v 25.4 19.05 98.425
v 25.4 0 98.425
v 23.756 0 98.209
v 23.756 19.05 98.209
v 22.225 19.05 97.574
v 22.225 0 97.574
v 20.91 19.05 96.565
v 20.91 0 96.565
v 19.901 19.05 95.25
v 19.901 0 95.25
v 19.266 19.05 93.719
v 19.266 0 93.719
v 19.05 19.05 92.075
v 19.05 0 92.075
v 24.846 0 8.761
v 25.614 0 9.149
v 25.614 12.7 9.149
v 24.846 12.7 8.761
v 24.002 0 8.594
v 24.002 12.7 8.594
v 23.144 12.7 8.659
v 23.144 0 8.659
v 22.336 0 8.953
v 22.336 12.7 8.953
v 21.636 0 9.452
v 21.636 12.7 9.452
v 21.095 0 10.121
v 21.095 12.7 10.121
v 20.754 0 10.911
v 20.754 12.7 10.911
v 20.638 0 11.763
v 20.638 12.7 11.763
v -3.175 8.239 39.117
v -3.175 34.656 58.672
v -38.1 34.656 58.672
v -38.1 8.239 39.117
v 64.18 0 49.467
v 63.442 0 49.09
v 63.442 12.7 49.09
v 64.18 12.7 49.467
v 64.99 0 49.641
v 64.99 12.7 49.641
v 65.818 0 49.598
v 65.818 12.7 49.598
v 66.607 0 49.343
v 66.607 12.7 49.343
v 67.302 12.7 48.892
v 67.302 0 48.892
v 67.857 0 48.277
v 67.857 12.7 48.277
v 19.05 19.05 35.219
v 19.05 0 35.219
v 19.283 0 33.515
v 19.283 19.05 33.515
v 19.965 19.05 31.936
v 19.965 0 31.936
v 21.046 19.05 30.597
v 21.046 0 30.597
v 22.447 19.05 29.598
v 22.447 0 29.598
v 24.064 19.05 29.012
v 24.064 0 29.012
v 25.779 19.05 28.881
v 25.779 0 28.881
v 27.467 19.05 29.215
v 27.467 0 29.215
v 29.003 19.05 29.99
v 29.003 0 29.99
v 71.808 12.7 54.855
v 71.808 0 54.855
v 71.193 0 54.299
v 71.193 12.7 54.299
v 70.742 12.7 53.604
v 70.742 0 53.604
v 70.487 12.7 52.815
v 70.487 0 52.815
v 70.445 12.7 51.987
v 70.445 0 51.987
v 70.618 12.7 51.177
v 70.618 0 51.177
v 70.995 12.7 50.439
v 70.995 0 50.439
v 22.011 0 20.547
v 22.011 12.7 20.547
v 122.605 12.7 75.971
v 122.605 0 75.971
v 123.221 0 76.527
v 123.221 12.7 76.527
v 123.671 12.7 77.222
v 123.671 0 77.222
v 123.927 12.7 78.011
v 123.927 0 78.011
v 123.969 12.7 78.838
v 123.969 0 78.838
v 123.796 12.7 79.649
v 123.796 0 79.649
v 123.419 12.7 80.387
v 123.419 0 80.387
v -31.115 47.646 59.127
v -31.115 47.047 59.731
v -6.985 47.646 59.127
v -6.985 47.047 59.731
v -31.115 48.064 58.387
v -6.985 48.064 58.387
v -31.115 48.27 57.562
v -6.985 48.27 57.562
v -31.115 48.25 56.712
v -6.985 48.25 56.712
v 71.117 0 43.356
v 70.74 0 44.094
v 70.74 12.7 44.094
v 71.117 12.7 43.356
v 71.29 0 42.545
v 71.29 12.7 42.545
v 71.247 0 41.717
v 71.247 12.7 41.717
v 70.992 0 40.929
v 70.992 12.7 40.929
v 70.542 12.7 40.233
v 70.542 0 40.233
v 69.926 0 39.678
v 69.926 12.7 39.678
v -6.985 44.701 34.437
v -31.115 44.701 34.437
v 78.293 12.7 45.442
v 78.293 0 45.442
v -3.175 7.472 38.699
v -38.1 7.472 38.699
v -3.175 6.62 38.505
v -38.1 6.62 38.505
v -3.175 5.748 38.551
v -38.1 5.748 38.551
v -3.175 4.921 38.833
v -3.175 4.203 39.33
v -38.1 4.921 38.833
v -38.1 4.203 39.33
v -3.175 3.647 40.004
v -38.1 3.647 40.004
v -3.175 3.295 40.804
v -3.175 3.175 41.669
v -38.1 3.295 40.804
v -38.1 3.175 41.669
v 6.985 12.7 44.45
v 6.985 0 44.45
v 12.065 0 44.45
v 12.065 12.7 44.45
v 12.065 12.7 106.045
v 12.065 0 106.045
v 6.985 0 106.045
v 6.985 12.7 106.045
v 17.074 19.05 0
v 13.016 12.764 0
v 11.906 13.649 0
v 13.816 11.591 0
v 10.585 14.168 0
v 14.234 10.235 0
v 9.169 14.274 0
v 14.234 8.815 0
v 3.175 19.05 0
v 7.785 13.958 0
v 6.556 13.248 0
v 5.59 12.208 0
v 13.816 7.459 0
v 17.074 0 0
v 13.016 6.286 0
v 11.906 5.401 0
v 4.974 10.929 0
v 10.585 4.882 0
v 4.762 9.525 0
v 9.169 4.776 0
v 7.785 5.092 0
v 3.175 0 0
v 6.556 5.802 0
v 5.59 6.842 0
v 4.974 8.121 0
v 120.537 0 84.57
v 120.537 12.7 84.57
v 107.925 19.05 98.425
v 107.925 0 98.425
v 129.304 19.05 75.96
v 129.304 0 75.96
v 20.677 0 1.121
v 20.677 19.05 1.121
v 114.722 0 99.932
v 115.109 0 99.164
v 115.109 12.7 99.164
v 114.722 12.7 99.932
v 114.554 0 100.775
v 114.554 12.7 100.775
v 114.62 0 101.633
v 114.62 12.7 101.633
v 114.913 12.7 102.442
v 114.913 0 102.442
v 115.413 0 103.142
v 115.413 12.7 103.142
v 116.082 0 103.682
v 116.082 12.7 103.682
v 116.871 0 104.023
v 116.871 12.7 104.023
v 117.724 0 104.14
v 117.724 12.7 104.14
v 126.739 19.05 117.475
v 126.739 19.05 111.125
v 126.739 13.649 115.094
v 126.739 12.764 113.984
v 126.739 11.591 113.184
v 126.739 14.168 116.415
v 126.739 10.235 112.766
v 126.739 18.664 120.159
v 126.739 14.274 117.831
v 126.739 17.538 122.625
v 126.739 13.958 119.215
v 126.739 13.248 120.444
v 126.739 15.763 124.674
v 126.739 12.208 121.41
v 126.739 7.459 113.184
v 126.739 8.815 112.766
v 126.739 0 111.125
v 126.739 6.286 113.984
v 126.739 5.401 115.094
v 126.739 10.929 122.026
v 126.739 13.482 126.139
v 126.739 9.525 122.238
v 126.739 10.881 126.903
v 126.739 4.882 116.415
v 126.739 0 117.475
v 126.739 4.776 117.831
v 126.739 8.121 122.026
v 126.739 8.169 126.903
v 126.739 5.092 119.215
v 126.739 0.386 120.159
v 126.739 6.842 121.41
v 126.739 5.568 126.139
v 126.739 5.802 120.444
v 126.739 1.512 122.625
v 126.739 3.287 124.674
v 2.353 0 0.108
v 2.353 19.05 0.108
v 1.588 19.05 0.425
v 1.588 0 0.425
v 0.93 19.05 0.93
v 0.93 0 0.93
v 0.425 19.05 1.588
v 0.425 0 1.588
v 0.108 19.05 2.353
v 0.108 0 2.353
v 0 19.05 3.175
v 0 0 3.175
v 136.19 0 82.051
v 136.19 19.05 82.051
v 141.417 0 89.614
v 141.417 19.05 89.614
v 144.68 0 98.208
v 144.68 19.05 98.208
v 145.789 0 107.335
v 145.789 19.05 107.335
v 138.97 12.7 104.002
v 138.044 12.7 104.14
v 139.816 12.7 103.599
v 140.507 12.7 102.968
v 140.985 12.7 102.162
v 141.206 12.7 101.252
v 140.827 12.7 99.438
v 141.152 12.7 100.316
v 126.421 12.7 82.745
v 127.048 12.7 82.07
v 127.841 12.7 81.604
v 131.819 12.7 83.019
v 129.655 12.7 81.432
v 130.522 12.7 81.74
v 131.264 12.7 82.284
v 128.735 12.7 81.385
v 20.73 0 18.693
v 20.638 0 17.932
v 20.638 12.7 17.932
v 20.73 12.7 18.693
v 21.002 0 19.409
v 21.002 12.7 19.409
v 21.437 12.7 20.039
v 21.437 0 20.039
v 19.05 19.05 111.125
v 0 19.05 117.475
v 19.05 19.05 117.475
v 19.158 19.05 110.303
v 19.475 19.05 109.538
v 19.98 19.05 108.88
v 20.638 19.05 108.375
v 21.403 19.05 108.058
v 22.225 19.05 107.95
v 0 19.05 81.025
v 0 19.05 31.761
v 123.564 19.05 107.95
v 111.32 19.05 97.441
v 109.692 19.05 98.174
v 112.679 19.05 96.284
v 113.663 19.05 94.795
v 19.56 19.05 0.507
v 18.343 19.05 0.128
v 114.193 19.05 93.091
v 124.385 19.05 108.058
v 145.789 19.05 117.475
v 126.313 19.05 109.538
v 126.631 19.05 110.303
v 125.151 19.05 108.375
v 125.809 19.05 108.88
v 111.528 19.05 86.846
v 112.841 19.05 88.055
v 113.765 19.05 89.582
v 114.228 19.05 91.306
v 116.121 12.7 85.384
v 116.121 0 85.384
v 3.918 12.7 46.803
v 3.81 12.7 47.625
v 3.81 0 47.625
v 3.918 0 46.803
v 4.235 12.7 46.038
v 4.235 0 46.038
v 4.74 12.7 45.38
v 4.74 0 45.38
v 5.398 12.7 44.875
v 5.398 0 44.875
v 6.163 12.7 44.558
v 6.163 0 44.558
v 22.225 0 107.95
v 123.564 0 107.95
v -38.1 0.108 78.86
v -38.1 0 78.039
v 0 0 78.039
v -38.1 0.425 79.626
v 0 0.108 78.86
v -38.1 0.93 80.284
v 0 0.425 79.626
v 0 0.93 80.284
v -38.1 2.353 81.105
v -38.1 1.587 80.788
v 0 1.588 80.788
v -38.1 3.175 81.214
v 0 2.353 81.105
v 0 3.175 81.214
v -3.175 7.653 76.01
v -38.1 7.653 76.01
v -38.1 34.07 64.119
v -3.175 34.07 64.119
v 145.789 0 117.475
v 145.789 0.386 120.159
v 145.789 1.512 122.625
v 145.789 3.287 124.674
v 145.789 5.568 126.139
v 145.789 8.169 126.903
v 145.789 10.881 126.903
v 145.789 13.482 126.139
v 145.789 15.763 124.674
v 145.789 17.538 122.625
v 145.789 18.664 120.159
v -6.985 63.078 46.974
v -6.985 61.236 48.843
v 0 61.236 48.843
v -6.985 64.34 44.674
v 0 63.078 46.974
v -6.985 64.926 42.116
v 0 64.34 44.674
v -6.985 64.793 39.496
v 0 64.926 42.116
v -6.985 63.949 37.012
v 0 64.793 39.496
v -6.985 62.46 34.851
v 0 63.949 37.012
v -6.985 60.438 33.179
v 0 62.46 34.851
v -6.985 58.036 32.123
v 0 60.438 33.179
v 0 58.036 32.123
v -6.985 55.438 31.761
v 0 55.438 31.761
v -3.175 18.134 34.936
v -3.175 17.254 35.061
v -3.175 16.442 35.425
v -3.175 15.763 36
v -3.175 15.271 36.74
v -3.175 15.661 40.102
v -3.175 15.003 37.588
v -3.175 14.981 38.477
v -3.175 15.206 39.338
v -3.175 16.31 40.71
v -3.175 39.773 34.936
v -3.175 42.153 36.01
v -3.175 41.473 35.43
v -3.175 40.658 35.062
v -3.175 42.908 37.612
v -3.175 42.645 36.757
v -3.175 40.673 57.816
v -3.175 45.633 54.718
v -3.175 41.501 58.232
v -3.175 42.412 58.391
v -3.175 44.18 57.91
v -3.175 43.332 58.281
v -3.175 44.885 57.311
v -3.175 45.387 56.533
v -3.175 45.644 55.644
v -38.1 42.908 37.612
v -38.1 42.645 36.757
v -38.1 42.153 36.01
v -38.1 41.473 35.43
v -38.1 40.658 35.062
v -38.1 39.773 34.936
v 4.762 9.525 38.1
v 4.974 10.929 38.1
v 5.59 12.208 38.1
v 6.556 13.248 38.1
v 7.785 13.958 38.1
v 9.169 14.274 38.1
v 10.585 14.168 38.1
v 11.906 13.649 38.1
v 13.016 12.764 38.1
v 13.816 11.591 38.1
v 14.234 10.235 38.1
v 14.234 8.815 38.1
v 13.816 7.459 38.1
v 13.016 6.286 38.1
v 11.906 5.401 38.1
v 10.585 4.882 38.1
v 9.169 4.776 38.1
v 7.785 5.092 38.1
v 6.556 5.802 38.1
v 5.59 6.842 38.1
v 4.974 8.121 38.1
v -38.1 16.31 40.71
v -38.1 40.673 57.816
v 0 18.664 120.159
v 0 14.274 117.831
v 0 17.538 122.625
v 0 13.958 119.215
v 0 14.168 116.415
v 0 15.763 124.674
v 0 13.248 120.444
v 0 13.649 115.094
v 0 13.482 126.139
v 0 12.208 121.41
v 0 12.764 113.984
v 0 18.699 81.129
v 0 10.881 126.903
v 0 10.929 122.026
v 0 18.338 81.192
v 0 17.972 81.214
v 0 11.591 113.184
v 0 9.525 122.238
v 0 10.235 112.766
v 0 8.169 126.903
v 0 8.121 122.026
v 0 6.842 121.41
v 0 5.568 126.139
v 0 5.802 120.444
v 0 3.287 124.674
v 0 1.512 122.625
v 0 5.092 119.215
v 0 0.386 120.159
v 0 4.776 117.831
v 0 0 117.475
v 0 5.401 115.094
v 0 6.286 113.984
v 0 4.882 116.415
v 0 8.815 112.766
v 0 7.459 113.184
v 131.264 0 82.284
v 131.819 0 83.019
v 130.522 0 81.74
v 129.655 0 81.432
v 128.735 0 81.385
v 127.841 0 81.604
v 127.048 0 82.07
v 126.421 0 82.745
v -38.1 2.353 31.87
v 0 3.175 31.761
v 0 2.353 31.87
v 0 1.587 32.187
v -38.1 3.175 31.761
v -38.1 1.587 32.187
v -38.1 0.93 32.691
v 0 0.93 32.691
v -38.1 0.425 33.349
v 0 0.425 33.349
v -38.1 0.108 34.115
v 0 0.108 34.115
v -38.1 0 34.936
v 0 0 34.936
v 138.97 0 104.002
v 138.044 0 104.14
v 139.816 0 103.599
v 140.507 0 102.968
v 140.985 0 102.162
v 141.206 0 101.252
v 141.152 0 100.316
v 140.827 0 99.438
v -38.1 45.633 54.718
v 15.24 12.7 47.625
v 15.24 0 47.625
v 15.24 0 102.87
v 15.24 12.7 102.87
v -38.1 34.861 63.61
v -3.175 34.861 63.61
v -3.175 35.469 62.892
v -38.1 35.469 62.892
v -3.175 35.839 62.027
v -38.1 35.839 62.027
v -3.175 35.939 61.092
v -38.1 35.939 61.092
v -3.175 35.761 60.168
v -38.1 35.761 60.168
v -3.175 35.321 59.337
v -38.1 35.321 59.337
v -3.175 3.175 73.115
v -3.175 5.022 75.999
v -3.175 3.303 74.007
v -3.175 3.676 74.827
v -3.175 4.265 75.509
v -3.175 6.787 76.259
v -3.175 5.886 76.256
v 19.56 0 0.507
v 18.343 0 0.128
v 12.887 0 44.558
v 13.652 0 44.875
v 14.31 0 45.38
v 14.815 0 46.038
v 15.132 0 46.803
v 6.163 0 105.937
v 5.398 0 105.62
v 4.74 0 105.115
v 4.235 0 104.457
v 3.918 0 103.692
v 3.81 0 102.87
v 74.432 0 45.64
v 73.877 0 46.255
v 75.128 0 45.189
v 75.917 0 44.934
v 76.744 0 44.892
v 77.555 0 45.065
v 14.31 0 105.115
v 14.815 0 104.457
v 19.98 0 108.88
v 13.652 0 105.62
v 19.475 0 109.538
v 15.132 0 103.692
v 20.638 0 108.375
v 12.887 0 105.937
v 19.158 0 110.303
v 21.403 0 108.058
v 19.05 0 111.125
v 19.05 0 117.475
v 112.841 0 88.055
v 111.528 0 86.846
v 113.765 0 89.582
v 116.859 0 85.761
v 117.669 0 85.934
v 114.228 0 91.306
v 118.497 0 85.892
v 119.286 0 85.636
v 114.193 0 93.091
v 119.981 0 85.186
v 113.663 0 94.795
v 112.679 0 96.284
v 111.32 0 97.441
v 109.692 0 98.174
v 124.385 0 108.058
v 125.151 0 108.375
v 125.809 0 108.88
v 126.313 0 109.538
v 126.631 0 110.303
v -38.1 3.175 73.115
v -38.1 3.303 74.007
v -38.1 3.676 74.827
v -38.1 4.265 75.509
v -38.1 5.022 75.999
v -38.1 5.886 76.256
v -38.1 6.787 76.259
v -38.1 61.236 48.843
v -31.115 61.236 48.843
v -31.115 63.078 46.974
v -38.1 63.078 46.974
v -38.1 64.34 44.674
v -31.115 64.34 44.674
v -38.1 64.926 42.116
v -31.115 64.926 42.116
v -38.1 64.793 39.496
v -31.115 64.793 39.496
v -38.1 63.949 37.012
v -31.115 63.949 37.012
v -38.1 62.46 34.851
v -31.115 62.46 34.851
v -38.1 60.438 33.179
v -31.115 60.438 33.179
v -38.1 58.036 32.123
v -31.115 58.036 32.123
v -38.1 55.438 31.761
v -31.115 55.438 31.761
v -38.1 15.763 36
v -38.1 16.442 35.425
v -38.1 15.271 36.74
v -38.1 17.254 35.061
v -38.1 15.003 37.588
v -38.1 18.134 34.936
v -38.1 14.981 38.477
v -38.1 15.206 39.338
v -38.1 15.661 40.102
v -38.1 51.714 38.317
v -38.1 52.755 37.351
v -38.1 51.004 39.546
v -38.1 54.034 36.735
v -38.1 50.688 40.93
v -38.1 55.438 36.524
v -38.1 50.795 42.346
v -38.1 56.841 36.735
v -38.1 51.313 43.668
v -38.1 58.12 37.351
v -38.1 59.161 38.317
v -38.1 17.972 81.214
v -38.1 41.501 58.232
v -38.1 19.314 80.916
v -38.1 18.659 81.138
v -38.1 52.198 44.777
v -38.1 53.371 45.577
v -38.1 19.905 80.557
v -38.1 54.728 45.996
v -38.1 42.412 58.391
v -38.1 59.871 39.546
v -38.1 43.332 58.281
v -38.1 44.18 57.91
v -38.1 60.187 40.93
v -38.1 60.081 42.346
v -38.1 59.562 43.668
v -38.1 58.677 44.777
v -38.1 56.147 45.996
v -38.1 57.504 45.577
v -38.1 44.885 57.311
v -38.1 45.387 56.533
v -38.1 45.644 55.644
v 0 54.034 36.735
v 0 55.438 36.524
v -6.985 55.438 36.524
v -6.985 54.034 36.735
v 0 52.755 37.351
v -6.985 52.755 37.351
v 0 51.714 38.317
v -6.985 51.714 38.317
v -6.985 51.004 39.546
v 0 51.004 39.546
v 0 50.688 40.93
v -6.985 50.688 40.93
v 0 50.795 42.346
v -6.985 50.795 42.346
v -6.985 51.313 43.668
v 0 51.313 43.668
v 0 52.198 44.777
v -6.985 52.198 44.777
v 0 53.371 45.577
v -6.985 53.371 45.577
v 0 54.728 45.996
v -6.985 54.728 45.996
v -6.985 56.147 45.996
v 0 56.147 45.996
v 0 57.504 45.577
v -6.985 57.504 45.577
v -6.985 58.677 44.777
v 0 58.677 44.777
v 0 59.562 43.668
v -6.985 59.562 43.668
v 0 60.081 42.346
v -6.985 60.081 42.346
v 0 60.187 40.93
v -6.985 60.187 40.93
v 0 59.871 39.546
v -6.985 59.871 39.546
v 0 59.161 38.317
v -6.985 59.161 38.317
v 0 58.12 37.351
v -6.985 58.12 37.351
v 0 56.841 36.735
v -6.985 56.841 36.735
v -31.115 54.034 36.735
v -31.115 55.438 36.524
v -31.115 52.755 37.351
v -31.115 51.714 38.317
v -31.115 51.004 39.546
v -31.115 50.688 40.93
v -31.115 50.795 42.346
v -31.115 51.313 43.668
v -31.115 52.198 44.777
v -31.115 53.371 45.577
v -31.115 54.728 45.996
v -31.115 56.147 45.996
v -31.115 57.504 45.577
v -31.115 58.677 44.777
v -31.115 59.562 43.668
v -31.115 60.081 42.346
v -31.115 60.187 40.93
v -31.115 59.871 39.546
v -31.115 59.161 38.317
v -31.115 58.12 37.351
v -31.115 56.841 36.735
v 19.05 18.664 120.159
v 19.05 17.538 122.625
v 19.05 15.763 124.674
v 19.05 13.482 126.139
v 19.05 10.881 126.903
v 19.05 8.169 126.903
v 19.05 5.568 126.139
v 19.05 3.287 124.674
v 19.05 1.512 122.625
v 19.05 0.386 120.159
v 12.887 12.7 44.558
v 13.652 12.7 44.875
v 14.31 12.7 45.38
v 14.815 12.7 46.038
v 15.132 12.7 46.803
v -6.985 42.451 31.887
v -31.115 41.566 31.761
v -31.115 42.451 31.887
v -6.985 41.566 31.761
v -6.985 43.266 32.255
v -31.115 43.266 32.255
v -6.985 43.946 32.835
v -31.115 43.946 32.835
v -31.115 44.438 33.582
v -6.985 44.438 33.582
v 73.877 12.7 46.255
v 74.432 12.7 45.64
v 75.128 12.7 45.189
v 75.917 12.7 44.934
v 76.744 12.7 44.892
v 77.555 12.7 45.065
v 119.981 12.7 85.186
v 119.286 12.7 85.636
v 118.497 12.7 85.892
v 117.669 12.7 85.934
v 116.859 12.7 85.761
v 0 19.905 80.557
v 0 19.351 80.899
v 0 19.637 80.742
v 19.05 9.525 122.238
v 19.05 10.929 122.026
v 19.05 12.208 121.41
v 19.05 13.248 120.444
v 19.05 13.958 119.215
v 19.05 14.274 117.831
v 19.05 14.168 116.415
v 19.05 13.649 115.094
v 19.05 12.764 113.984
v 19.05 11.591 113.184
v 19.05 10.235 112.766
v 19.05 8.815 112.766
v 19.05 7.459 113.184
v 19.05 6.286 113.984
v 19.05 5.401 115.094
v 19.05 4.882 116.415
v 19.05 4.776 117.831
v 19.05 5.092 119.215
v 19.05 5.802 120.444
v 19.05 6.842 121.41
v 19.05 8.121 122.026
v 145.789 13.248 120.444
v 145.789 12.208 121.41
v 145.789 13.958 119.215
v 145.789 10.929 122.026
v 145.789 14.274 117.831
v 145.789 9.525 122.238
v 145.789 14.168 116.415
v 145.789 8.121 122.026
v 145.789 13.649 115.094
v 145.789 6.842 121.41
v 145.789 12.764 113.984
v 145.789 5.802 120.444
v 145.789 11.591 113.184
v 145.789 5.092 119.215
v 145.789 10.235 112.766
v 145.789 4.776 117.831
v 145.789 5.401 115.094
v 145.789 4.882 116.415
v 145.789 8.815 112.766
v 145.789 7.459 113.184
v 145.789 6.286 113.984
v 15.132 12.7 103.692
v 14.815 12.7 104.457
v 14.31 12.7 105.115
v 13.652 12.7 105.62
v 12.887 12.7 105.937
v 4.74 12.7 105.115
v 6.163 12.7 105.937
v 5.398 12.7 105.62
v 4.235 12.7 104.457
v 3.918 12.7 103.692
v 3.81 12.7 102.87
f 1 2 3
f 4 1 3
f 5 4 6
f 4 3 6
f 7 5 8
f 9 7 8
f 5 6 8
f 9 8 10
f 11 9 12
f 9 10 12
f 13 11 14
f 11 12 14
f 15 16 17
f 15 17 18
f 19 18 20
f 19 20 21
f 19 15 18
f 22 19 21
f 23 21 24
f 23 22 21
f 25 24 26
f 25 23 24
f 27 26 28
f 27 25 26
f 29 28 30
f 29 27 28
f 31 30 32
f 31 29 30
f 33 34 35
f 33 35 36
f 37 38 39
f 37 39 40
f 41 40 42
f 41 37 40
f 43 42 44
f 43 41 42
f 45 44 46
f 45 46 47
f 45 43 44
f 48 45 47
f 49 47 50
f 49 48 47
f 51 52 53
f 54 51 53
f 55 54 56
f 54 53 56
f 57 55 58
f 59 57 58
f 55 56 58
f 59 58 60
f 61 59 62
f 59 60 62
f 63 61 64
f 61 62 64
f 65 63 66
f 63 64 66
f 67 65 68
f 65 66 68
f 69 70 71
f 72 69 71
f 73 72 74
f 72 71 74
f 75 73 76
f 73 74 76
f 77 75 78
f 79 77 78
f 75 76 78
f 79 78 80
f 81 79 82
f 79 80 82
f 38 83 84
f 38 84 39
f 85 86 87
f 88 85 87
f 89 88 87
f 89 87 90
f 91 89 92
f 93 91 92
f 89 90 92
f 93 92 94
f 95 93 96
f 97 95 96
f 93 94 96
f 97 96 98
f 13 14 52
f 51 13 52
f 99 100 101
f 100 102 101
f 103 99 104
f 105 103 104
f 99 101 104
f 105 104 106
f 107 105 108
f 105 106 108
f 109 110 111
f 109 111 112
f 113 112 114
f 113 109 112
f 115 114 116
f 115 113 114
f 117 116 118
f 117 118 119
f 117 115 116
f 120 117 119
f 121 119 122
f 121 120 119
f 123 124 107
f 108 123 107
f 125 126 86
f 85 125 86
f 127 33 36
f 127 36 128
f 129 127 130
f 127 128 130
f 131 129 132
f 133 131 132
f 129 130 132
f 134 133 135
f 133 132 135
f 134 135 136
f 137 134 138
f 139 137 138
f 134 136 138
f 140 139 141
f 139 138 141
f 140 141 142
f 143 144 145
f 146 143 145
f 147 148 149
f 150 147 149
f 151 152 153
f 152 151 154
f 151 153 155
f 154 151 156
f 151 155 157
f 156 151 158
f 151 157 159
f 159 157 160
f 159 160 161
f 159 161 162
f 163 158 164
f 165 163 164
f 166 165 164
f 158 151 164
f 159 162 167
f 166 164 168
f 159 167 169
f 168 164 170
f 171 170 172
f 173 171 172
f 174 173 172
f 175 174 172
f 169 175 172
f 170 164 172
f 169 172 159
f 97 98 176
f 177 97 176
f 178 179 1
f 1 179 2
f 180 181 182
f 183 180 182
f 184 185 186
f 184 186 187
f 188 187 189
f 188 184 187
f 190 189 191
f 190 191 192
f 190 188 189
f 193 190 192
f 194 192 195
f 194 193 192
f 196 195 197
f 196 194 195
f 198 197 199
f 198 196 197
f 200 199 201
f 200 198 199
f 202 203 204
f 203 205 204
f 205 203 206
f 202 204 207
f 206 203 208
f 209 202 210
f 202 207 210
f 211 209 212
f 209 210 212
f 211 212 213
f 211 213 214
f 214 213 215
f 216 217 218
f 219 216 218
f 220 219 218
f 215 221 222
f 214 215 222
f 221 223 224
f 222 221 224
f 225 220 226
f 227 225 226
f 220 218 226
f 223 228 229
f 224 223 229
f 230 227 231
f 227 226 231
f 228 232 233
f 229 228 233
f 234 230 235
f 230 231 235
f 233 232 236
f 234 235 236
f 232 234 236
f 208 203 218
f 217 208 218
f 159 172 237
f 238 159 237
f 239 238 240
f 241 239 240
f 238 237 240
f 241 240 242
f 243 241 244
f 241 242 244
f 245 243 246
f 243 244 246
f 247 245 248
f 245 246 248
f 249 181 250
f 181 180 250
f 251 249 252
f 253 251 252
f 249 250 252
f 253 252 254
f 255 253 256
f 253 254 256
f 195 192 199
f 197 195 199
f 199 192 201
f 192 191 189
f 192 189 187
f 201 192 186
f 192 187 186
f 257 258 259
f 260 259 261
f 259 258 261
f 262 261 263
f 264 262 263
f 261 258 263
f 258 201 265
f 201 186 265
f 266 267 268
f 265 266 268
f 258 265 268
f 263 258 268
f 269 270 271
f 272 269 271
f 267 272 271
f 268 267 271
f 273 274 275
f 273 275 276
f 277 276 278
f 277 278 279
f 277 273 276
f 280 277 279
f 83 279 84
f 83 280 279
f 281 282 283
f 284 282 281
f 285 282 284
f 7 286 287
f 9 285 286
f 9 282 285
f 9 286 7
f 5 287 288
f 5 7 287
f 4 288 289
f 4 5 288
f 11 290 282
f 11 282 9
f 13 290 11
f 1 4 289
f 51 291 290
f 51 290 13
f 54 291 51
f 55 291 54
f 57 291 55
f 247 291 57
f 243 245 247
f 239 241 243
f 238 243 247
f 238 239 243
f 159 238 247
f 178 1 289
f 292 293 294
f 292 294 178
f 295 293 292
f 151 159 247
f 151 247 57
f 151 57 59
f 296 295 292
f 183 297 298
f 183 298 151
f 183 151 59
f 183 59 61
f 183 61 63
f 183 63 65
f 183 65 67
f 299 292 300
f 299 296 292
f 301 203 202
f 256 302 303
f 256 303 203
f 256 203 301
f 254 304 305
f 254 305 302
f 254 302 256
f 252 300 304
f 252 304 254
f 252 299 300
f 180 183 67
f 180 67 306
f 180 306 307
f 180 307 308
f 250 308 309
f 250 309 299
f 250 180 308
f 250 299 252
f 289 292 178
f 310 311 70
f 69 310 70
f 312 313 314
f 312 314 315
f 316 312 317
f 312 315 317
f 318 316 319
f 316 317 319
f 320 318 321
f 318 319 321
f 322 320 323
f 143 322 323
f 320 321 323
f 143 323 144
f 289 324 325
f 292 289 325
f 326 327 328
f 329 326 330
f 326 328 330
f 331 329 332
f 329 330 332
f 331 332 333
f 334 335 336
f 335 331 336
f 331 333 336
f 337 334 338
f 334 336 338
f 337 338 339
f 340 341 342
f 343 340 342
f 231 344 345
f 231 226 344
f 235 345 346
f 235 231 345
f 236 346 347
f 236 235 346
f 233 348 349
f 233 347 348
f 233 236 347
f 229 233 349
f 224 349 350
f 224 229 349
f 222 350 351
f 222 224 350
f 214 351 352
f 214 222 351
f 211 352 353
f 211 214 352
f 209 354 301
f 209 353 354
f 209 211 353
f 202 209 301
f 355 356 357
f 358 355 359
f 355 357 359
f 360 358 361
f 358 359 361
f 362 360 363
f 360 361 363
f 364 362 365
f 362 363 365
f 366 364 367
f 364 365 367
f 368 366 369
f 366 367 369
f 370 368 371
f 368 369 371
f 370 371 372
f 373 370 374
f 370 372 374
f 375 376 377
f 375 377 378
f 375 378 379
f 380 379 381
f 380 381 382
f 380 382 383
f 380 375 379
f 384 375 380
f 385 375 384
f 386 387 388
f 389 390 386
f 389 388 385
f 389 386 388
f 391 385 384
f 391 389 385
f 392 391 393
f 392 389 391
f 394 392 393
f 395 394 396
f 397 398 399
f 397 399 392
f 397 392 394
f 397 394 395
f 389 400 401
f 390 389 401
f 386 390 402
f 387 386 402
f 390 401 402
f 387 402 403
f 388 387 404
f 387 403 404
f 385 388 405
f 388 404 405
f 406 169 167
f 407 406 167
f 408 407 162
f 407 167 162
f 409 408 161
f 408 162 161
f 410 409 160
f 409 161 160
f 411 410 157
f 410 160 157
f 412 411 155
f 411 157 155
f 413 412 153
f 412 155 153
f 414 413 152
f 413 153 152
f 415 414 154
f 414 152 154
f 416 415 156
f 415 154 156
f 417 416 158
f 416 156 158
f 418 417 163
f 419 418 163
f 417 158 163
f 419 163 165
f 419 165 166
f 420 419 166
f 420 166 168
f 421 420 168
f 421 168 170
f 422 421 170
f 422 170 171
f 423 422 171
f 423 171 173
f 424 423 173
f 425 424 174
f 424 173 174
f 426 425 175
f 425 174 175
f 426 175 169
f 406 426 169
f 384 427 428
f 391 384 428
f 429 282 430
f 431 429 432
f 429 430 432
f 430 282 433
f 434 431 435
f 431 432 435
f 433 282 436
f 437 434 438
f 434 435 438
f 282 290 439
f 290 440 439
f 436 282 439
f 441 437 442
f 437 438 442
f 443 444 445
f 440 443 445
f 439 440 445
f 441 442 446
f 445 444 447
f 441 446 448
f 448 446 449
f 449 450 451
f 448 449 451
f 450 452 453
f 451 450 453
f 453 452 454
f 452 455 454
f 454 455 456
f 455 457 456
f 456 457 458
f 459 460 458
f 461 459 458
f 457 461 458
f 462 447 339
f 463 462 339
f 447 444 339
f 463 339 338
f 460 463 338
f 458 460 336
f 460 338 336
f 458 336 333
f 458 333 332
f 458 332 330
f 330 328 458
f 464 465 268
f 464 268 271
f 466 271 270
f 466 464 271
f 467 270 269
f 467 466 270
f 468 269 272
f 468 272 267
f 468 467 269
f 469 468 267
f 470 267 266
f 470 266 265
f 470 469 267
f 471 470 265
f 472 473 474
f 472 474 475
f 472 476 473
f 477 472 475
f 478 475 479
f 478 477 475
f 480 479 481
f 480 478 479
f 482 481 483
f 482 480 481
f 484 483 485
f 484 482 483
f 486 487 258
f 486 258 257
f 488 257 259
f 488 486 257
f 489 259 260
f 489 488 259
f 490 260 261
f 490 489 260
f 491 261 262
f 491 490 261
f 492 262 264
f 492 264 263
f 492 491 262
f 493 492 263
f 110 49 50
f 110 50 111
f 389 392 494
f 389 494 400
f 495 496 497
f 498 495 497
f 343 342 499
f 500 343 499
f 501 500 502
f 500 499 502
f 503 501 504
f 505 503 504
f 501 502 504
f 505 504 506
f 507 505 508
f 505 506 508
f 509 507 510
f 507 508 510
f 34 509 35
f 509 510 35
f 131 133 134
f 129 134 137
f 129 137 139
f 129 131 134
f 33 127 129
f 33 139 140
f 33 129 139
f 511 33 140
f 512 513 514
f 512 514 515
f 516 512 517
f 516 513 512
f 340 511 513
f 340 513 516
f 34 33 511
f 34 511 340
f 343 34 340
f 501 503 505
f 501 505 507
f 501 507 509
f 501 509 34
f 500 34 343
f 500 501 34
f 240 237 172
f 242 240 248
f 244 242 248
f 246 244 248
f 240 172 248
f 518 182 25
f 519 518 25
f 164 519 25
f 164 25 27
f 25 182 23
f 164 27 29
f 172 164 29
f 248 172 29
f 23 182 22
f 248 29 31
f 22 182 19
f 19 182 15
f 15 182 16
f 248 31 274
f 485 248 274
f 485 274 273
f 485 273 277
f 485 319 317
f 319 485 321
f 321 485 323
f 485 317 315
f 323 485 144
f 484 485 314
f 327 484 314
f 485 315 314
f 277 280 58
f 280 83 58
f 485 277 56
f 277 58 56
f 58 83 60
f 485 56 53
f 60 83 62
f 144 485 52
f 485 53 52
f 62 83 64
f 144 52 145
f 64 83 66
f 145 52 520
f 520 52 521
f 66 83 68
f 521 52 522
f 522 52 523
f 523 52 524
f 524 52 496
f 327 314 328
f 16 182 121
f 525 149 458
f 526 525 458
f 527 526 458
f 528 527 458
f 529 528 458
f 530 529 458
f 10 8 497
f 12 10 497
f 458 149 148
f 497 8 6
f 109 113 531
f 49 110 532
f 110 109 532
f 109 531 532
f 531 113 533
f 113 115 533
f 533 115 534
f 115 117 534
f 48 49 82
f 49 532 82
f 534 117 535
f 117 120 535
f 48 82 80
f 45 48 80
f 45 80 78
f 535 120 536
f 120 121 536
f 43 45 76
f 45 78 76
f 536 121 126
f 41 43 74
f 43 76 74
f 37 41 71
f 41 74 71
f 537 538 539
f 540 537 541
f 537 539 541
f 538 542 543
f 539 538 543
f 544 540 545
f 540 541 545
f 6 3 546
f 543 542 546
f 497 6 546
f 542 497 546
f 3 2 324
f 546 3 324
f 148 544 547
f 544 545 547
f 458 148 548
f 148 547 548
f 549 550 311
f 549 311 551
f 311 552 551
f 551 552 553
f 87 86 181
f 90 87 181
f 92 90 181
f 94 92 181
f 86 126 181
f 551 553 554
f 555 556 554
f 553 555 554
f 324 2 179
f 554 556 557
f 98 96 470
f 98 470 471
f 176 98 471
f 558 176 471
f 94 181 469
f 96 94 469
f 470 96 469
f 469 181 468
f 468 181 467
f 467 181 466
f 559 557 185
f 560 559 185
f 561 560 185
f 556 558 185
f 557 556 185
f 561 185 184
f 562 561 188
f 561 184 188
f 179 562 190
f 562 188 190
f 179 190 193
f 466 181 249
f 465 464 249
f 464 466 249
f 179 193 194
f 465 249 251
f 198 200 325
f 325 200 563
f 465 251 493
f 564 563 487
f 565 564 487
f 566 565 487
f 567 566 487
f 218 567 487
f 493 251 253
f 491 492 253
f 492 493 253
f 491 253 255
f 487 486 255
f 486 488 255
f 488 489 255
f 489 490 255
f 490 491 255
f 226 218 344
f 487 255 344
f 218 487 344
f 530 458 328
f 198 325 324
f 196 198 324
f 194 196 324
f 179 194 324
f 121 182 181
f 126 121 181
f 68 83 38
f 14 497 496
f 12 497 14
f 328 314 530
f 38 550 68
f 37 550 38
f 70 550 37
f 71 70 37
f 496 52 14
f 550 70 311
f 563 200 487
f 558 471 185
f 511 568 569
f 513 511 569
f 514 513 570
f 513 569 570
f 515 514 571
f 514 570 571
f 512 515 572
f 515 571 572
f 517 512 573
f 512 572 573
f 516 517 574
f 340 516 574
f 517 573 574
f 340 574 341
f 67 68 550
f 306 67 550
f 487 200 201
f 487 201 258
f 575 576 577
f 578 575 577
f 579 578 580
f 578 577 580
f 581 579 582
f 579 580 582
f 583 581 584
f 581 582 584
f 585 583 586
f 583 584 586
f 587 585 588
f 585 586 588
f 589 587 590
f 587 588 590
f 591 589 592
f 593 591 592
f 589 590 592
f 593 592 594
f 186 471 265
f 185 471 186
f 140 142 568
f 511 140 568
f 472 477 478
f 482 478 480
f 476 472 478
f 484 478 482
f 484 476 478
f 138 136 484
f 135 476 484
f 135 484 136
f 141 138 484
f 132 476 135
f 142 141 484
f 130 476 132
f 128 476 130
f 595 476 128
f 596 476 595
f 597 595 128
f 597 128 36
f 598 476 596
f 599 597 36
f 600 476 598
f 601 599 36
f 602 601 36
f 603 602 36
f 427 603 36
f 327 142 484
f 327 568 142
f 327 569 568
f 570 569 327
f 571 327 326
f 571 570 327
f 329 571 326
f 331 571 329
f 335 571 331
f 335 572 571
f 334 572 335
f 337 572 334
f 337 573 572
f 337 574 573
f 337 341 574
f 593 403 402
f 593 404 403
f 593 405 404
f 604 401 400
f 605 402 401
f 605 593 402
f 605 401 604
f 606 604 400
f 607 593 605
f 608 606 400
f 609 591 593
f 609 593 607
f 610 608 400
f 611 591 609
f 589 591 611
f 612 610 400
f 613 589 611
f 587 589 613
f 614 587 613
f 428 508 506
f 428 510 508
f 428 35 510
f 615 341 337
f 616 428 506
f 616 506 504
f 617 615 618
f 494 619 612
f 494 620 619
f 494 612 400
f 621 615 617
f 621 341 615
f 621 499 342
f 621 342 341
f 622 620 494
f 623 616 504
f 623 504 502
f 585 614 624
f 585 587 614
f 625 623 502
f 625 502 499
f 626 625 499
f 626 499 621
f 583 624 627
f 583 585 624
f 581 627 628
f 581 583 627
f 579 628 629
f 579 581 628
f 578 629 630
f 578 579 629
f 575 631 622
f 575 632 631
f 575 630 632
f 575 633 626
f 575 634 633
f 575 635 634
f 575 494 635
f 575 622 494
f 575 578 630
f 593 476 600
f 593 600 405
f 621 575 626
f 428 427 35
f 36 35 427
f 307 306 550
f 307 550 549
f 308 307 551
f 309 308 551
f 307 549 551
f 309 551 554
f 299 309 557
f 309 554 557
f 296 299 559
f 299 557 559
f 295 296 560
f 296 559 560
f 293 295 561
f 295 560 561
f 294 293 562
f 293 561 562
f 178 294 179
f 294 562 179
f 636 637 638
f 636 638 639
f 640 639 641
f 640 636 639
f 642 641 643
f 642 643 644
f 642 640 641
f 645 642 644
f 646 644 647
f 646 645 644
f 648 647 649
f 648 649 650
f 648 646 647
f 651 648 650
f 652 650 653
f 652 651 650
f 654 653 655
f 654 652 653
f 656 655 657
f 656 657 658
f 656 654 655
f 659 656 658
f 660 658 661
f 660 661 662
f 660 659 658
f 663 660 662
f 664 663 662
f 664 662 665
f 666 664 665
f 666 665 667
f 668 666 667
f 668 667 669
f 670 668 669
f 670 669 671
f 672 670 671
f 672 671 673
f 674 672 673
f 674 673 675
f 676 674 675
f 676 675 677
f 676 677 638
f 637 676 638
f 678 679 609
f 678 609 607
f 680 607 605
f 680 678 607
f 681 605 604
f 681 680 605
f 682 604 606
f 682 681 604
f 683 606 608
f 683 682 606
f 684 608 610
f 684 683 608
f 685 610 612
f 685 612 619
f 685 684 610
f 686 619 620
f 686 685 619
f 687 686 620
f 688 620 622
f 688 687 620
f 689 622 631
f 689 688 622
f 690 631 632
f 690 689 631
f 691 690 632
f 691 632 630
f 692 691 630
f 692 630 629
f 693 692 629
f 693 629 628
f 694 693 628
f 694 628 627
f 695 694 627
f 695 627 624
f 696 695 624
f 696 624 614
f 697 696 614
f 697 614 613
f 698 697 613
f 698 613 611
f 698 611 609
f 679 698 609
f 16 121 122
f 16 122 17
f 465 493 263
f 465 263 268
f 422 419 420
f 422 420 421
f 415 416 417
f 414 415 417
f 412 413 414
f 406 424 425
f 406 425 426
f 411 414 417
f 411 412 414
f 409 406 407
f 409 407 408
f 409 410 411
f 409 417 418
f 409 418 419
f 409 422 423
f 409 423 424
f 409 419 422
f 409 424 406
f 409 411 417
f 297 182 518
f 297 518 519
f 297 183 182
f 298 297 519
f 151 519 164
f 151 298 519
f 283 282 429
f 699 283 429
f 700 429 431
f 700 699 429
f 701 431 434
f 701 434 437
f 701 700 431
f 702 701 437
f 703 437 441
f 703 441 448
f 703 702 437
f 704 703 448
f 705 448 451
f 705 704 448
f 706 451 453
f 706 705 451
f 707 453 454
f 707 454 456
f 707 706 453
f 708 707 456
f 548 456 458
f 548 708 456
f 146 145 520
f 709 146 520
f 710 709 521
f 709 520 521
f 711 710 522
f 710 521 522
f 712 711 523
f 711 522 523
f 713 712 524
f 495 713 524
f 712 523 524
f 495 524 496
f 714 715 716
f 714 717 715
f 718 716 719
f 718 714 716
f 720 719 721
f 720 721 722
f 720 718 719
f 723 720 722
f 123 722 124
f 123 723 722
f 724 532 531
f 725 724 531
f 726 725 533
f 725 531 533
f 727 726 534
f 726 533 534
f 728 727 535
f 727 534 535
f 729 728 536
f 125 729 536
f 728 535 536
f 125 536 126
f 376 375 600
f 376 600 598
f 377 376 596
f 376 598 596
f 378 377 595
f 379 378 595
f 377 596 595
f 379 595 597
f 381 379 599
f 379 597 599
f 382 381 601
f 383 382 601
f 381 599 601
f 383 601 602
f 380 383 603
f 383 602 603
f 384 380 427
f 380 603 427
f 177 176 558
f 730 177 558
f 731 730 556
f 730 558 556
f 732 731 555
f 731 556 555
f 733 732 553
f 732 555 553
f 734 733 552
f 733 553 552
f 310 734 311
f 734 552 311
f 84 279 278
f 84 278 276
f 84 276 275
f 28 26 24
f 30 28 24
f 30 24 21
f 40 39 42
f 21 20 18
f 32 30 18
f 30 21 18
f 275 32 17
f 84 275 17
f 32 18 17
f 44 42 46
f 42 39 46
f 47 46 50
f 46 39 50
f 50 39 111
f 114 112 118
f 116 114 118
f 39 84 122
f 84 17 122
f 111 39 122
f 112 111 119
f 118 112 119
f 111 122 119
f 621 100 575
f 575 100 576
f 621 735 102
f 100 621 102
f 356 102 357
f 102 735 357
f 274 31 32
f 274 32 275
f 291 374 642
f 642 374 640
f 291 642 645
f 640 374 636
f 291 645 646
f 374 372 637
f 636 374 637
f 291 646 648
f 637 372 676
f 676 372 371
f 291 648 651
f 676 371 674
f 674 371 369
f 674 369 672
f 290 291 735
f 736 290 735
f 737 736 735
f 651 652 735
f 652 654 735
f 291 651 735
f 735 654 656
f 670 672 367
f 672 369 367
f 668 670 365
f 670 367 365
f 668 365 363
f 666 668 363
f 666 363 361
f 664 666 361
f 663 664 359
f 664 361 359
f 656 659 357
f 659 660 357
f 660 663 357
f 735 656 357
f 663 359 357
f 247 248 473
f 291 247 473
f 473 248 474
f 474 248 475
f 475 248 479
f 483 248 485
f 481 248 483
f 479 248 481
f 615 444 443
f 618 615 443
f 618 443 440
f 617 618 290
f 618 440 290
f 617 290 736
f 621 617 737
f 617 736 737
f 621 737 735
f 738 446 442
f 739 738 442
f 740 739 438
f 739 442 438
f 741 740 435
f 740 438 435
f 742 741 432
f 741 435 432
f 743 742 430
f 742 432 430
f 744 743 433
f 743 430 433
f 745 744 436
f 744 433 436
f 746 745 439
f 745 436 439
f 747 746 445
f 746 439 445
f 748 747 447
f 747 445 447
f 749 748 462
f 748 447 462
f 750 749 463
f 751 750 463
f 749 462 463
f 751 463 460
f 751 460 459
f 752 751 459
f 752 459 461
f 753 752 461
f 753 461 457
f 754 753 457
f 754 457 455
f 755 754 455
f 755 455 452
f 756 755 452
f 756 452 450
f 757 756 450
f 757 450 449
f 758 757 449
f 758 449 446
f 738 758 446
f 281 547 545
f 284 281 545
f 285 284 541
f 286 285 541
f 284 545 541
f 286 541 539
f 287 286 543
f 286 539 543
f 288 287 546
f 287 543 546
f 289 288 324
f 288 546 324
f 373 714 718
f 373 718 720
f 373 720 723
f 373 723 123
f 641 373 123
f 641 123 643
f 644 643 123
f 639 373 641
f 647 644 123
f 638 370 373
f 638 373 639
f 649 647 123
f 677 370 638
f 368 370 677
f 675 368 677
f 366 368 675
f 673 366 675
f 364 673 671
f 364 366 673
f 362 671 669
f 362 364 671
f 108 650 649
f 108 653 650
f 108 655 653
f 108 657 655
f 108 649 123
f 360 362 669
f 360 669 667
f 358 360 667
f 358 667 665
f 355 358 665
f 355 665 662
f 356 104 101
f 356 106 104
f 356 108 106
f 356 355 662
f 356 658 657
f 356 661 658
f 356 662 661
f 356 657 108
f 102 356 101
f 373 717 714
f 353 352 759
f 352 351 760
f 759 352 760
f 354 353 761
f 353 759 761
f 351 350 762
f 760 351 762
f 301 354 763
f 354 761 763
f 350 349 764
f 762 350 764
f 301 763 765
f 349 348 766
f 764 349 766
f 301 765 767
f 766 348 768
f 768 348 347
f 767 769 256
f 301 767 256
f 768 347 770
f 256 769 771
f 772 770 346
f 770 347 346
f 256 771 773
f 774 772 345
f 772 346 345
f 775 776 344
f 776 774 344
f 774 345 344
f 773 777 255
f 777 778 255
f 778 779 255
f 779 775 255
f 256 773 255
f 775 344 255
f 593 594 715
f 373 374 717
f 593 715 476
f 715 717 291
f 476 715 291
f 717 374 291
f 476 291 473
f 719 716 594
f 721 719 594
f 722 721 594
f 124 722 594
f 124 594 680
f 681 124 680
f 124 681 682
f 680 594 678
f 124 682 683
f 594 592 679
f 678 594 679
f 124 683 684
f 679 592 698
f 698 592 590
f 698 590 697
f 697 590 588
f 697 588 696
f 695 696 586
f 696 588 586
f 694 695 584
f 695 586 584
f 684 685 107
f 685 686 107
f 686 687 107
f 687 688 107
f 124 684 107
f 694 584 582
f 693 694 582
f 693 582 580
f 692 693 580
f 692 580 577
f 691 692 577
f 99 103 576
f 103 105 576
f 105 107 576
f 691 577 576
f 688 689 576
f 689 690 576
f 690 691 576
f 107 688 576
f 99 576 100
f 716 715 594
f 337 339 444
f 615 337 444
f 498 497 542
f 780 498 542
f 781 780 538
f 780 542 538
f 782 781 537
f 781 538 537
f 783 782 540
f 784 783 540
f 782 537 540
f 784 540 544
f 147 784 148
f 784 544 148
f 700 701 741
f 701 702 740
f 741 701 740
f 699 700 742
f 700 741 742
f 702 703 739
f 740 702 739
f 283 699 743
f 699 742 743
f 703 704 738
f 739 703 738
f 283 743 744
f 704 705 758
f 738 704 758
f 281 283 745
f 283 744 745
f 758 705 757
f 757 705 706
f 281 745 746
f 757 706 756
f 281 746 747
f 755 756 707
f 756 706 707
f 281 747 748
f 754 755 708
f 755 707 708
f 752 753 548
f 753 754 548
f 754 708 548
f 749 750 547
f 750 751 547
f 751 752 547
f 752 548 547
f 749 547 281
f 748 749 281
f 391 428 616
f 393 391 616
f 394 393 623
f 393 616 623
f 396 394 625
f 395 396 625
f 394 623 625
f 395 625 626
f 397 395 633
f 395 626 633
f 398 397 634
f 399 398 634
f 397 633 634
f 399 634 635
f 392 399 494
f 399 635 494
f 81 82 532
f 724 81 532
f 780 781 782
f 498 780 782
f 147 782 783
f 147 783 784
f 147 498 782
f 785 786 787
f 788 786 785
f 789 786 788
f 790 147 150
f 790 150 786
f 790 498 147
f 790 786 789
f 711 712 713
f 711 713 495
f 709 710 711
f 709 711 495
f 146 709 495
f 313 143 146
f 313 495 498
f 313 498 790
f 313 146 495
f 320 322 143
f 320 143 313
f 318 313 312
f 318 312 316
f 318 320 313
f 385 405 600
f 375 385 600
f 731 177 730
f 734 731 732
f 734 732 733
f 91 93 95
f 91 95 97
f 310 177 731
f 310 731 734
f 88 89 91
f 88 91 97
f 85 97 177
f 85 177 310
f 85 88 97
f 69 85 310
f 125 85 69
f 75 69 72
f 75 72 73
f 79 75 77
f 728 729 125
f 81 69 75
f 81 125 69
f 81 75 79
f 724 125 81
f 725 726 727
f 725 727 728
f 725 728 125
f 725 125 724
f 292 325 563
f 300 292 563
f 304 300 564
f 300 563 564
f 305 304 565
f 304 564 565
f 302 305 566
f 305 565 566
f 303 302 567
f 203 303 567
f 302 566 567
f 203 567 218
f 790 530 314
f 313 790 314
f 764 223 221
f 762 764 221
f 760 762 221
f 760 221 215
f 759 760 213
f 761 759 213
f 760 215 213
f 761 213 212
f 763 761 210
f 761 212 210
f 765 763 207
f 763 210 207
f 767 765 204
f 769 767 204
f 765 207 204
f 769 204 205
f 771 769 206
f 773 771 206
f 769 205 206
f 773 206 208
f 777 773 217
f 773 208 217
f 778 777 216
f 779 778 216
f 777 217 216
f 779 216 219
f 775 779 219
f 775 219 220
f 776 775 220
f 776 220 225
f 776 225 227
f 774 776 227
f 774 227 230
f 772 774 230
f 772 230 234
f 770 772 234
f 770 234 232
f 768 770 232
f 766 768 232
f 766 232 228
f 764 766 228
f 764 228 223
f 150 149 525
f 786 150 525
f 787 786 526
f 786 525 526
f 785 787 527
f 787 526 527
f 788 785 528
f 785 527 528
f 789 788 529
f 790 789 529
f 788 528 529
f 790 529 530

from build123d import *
from build123d.topology import SkipClean

# Parameters (mm, degrees)
BOSS_EXTRUDE1_DEPTH = 19.05
SKETCH7_R           = 4.7625
CUT_EXTRUDE7_DEPTH  = 38.1
FILLET4_R           = 38.1
FILLET5_R           = 6.35
SKETCH8_R           = 4.7625
CUT_EXTRUDE8_DEPTH  = 195.283940649
FILLET6_RADIUS      = 9.525
FILLET6_LENGTH      = 19.05
FILLET7_RADIUS      = 9.525
FILLET7_LENGTH      = 19.05
CUT_EXTRUDE9_START  = -19.05
CUT_EXTRUDE9_DEPTH  = 12.7
CUT_EXTRUDE10_START = -19.05
CUT_EXTRUDE10_DEPTH = 12.7
CUT_EXTRUDE11_START = -19.05
CUT_EXTRUDE11_DEPTH = 12.7
SKETCH12_R          = 4.7625
BOSS_EXTRUDE2_DEPTH = 38.1
CUT_EXTRUDE12_DEPTH = 34.925
CUT_EXTRUDE13_START = -6.985
SKETCH13_4_R        = 4.7625
CUT_EXTRUDE13_DEPTH = 24.13
FILLET13_R          = 3.175
FILLET14_R          = 3.175
FILLET15_R          = 3.175


with BuildPart() as part:
    # Sketch1 → Boss-Extrude1 (new body)
    with BuildSketch(Plane(origin=(0, 0, 0), x_dir=(1, 0, 0), z_dir=(0, 1, 0))):
        with BuildLine():
            ThreePointArc((3.175, 0), (0.92993597, -0.92993597), (0, -3.175))
            Line((0, -3.175), (0, -127))
            Line((0, -127), (19.05, -127))
            Line((19.05, -127), (19.05, -111.125))
            ThreePointArc((19.05, -111.125), (19.97993597, -108.87993597), (22.225, -107.95))
            Line((22.225, -107.95), (123.563707018, -107.95))
            ThreePointArc((123.563707018, -107.95), (125.808771048, -108.87993597), (126.738707018, -111.125))
            Line((126.738707018, -111.125), (126.738707018, -127))
            Line((126.738707018, -127), (145.788707018, -127))
            Line((145.788707018, -127), (145.788707018, -87.316702208))
            Line((145.788707018, -87.316702208), (19.05, 0))
            Line((19.05, 0), (3.175, 0))
        make_face()
        with BuildLine():
            Line((29.002606919, -29.990275978), (111.5275446, -86.845877379))
            ThreePointArc((111.5275446, -86.845877379), (113.98824654, -93.961474404), (107.924937681, -98.425))
            Line((107.924937681, -98.425), (25.4, -98.425))
            ThreePointArc((25.4, -98.425), (20.909871939, -96.565128061), (19.05, -92.075))
            Line((19.05, -92.075), (19.05, -35.2193986))
            ThreePointArc((19.05, -35.2193986), (22.446532033, -29.598052945), (29.002606919, -29.990275978))
        make_face(mode=Mode.SUBTRACT)
    extrude(amount=BOSS_EXTRUDE1_DEPTH)

    # Sketch7 → Cut-Extrude7 (cut)
    with BuildSketch(Plane(origin=(0, 0, 0), x_dir=(-1, 0, 0), z_dir=(0, 0, -1))):
        with Locations((-9.525, 9.525)):
            Circle(SKETCH7_R)
    extrude(amount=-CUT_EXTRUDE7_DEPTH, mode=Mode.SUBTRACT)

    # Fillet4
    fillet4_edges = [part.edges().sort_by_distance(p)[0] for p in [
        (145.788707018, 9.525, 87.316702208),
    ]]
    fillet(fillet4_edges, radius=FILLET4_R)

    # Fillet5
    fillet5_edges = [part.edges().sort_by_distance(p)[0] for p in [
        (19.05, 9.525, 0),
    ]]
    fillet(fillet5_edges, radius=FILLET5_R)

    # Sketch8 → Cut-Extrude8 (cut, through all)
    with BuildSketch(Plane.ZY):
        with Locations((117.475, 9.525)):
            Circle(SKETCH8_R)
    extrude(amount=-CUT_EXTRUDE8_DEPTH, mode=Mode.SUBTRACT)

    # Fillet6: full round fillet: the end face becomes a half cylinder, R = half its width
    fillet6_face = Plane((9.525, 9.525, 127), x_dir=(1, 0, 0), z_dir=(0, 0, 1))  # on the end face: x along it, z out of the body
    fillet6_slab = fillet6_face.offset(-FILLET6_RADIUS / 2) * Box(FILLET6_LENGTH, 2 * FILLET6_RADIUS, FILLET6_RADIUS, mode=Mode.PRIVATE)  # the body's end, R deep
    fillet6_round = Plane((9.525, 9.525, 117.475), x_dir=(0, 0, 1), z_dir=(1, 0, 0)) * Cylinder(FILLET6_RADIUS, FILLET6_LENGTH, mode=Mode.PRIVATE)  # its axis R under the face
    add(fillet6_slab - fillet6_round, mode=Mode.SUBTRACT)

    # Fillet7: full round fillet: the end face becomes a half cylinder, R = half its width
    fillet7_face = Plane((136.263707018, 9.525, 127), x_dir=(-1, 0, 0), z_dir=(0, 0, 1))  # on the end face: x along it, z out of the body
    fillet7_slab = fillet7_face.offset(-FILLET7_RADIUS / 2) * Box(FILLET7_LENGTH, 2 * FILLET7_RADIUS, FILLET7_RADIUS, mode=Mode.PRIVATE)  # the body's end, R deep
    fillet7_round = Plane((136.263707018, 9.525, 117.475), x_dir=(0, 0, 1), z_dir=(-1, 0, 0)) * Cylinder(FILLET7_RADIUS, FILLET7_LENGTH, mode=Mode.PRIVATE)  # its axis R under the face
    add(fillet7_slab - fillet7_round, mode=Mode.SUBTRACT)

    # Sketch9 → Cut-Extrude9 (cut)
    with BuildSketch(Plane(origin=(0, 19.05, 0), x_dir=(1, 0, 0), z_dir=(0, 1, 0)).offset(CUT_EXTRUDE9_START)):
        with BuildLine():
            Line((6.985, -44.45), (12.065, -44.45))
            ThreePointArc((12.065, -44.45), (14.31006403, -45.37993597), (15.24, -47.625))
            Line((15.24, -47.625), (15.24, -92.075))
            Line((15.24, -92.075), (15.24, -102.87))
            ThreePointArc((15.24, -102.87), (14.31006403, -105.11506403), (12.065, -106.045))
            Line((12.065, -106.045), (6.985, -106.045))
            ThreePointArc((6.985, -106.045), (4.73993597, -105.11506403), (3.81, -102.87))
            Line((3.81, -102.87), (3.81, -47.625))
            ThreePointArc((3.81, -47.625), (4.73993597, -45.37993597), (6.985, -44.45))
        make_face()
    extrude(amount=CUT_EXTRUDE9_DEPTH, mode=Mode.SUBTRACT)

    # Sketch10 → Cut-Extrude10 (cut)
    with BuildSketch(Plane(origin=(0, 19.05, 0), x_dir=(1, 0, 0), z_dir=(0, 1, 0)).offset(CUT_EXTRUDE10_START)):
        with BuildLine():
            Line((20.6375, -11.763381719), (20.6375, -17.932294237))
            ThreePointArc((20.6375, -17.932294237), (21.001827173, -19.409028221), (22.011196541, -20.546855548))
            Line((22.011196541, -20.546855548), (63.441606739, -49.090359539))
            ThreePointArc((63.441606739, -49.090359539), (65.81797034, -49.598286152), (67.857471509, -48.277101687))
            Line((67.857471509, -48.277101687), (70.739557043, -44.09380359))
            ThreePointArc((70.739557043, -44.09380359), (71.247483656, -41.717439989), (69.926299192, -39.67793882))
            Line((69.926299192, -39.67793882), (25.613803459, -9.148820408))
            ThreePointArc((25.613803459, -9.148820408), (22.335766016, -8.952708891), (20.6375, -11.763381719))
        make_face()
        with BuildLine():
            Line((123.418648971, -80.387093072), (120.536563436, -84.570391169))
            ThreePointArc((120.536563436, -84.570391169), (118.497062267, -85.891575634), (116.120698666, -85.383649021))
            Line((116.120698666, -85.383649021), (71.808202933, -54.854530608))
            ThreePointArc((71.808202933, -54.854530608), (70.487018469, -52.815029439), (70.994945082, -50.438665838))
            Line((70.994945082, -50.438665838), (73.877030616, -46.255367741))
            ThreePointArc((73.877030616, -46.255367741), (75.916531785, -44.934183277), (78.292895386, -45.44210989))
            Line((78.292895386, -45.44210989), (122.605391119, -75.971228302))
            ThreePointArc((122.605391119, -75.971228302), (123.926575583, -78.010729471), (123.418648971, -80.387093072))
        make_face()
    extrude(amount=CUT_EXTRUDE10_DEPTH, mode=Mode.SUBTRACT)

    # Sketch11 → Cut-Extrude11 (cut)
    with BuildSketch(Plane(origin=(0, 19.05, 0), x_dir=(1, 0, 0), z_dir=(0, 1, 0)).offset(CUT_EXTRUDE11_START)):
        with BuildLine():
            Line((117.723743339, -104.14), (138.043743339, -104.14))
            ThreePointArc((138.043743339, -104.14), (140.775902425, -102.582384223), (140.82733452, -99.437831007))
            Line((140.82733452, -99.437831007), (131.819281268, -83.018732847))
            ThreePointArc((131.819281268, -83.018732847), (129.196718657, -81.374987965), (126.421128775, -82.74459838))
            Line((126.421128775, -82.74459838), (115.109182028, -99.163696541))
            ThreePointArc((115.109182028, -99.163696541), (114.913070511, -102.441733984), (117.723743339, -104.14))
        make_face()
    extrude(amount=CUT_EXTRUDE11_DEPTH, mode=Mode.SUBTRACT)

    # Sketch12 → Boss-Extrude2 (add)
    with BuildSketch(Plane.ZY):
        with BuildLine():
            Line((31.761333992, 55.437605021), (31.761333992, 0))
            Line((31.761333992, 0), (81.213525096, 0))
            Line((81.213525096, 0), (81.213525096, 19.05))
            Line((81.213525096, 19.05), (48.843024558, 61.236057633))
            ThreePointArc((48.843024558, 61.236057633), (38.224623085, 64.457114505), (31.761333992, 55.437605021))
        make_face()
        with Locations(Location((41.286333992, 55.437605021, 0), (0, 0, 180))):
            Circle(SKETCH12_R, mode=Mode.SUBTRACT)
    extrude(amount=BOSS_EXTRUDE2_DEPTH)

    # Sketch13 → Cut-Extrude12 (cut)
    with BuildSketch(Plane.ZY.offset(38.1)):
        with BuildLine():
            Line((34.936333992, 39.772832304), (34.936333992, 18.134396169))
            ThreePointArc((34.936333992, 18.134396169), (37.154655789, 15.106956357), (40.709809152, 16.309964245))
            Line((40.709809152, 16.309964245), (57.81580954, 40.673447753))
            ThreePointArc((57.81580954, 40.673447753), (57.910209366, 44.179857475), (54.717843702, 45.633343608))
            Line((54.717843702, 45.633343608), (37.611843313, 42.908296235))
            ThreePointArc((37.611843313, 42.908296235), (35.696120968, 41.833747404), (34.936333992, 39.772832304))
        make_face()
        with BuildLine():
            Line((41.668763699, 3.175), (73.114694638, 3.175))
            ThreePointArc((73.114694638, 3.175), (75.78099304, 4.626202497), (76.009912608, 7.653202941))
            Line((76.009912608, 7.653202941), (64.11901518, 34.070224292))
            ThreePointArc((64.11901518, 34.070224292), (61.563303547, 35.923817266), (58.671896573, 34.656049709))
            Line((58.671896573, 34.656049709), (39.116863062, 8.239028358))
            ThreePointArc((39.116863062, 8.239028358), (38.833425091, 4.921196311), (41.668763699, 3.175))
        make_face()
    extrude(amount=-CUT_EXTRUDE12_DEPTH, mode=Mode.SUBTRACT)

    # Sketch13<4> → Cut-Extrude13 (cut)
    # profile 1 of 3: a face of its own
    with SkipClean():  # the faces are left unmerged after this step: merging them gives an invalid solid
        with BuildSketch(Plane.ZY.offset(38.1).offset(CUT_EXTRUDE13_START)):
            with BuildLine():
                Line((37.611843313, 42.908296235), (54.717843702, 45.633343608))
                ThreePointArc((54.717843702, 45.633343608), (57.910209366, 44.179857475), (57.81580954, 40.673447753))
                Line((57.81580954, 40.673447753), (40.709809152, 16.309964245))
                ThreePointArc((40.709809152, 16.309964245), (37.154655789, 15.106956357), (34.936333992, 18.134396169))
                Line((34.936333992, 18.134396169), (34.936333992, 39.772832304))
                ThreePointArc((34.936333992, 39.772832304), (35.696120968, 41.833747404), (37.611843313, 42.908296235))
            make_face()
        # profile 2 of 3: a face of its own
        with BuildSketch(Plane.ZY.offset(38.1).offset(CUT_EXTRUDE13_START)):
            with BuildLine():
                Line((31.761333992, 44.275117198), (58.579423638, 48.547335312))
                Line((58.579423638, 48.547335312), (48.843044303, 61.236059961))
                ThreePointArc((48.843044303, 61.236059961), (38.22461551, 64.457129972), (31.761316911, 55.437590446))
                Line((31.761316911, 55.437590446), (31.761333992, 44.275117198))
            make_face()
            with Locations(Location((41.286333992, 55.437605021, 0), (0, 0, 180))):
                Circle(SKETCH13_4_R, mode=Mode.SUBTRACT)
        # profile 3 of 3: a face of its own
        with BuildSketch(Plane.ZY.offset(38.1).offset(CUT_EXTRUDE13_START)):
            with BuildLine():
                Line((39.116863062, 8.239028358), (58.671896573, 34.656049709))
                ThreePointArc((58.671896573, 34.656049709), (61.563303547, 35.923817266), (64.11901518, 34.070224292))
                Line((64.11901518, 34.070224292), (76.009912608, 7.653202941))
                ThreePointArc((76.009912608, 7.653202941), (75.78099304, 4.626202497), (73.114694638, 3.175))
                Line((73.114694638, 3.175), (41.668763699, 3.175))
                ThreePointArc((41.668763699, 3.175), (38.833425091, 4.921196311), (39.116863062, 8.239028358))
            make_face()
        extrude(amount=-CUT_EXTRUDE13_DEPTH, mode=Mode.SUBTRACT)
    add(part.part.scale(1), mode=Mode.REPLACE)  # the faces are merged on a copy

    # Fillet13
    fillet13_edges = [part.edges().sort_by_distance(p)[0] for p in [
        (-19.05, 44.275117198, 31.761333992),
        (-19.05, 48.547335312, 58.579423638),
    ]]
    fillet(fillet13_edges, radius=FILLET13_R)

    # Fillet14
    fillet14_edges = [part.edges().sort_by_distance(p)[0] for p in [
        (-19.05, 0, 31.761333992),
    ]]
    fillet(fillet14_edges, radius=FILLET14_R)

    # Fillet15
    # the kernel refuses this fillet: 3.175 mm, written as the material it takes off along each edge
    with BuildSketch(Plane(origin=(0, 19.05, 81.213525096), x_dir=(0, 0.7933533402912315, -0.6087614290087253), z_dir=(-1, 0, 0))) as fillet15_piece_1:
        with BuildLine():
            CenterArc((FILLET15_R * 0.339454258863, FILLET15_R), FILLET15_R, 232.5, 37.5)
            Line((-FILLET15_R * 0.269307170145, FILLET15_R * 0.206646659709), (0, 0))
            Line((0, 0), (FILLET15_R * 0.339454258863, 0))
        make_face()
    extrude(amount=40.79441818, mode=Mode.SUBTRACT)
    with BuildSketch(Plane(origin=(0, 0, 81.213525096), x_dir=(0, 0, -1), z_dir=(-1, 0, 0))) as fillet15_piece_2:
        with BuildLine():
            CenterArc((FILLET15_R, -FILLET15_R), FILLET15_R, 90, 90)
            Line((0, -FILLET15_R), (0, 0))
            Line((0, 0), (FILLET15_R, 0))
        make_face()
    extrude(amount=46.0375, mode=Mode.SUBTRACT)


solid = part.part
